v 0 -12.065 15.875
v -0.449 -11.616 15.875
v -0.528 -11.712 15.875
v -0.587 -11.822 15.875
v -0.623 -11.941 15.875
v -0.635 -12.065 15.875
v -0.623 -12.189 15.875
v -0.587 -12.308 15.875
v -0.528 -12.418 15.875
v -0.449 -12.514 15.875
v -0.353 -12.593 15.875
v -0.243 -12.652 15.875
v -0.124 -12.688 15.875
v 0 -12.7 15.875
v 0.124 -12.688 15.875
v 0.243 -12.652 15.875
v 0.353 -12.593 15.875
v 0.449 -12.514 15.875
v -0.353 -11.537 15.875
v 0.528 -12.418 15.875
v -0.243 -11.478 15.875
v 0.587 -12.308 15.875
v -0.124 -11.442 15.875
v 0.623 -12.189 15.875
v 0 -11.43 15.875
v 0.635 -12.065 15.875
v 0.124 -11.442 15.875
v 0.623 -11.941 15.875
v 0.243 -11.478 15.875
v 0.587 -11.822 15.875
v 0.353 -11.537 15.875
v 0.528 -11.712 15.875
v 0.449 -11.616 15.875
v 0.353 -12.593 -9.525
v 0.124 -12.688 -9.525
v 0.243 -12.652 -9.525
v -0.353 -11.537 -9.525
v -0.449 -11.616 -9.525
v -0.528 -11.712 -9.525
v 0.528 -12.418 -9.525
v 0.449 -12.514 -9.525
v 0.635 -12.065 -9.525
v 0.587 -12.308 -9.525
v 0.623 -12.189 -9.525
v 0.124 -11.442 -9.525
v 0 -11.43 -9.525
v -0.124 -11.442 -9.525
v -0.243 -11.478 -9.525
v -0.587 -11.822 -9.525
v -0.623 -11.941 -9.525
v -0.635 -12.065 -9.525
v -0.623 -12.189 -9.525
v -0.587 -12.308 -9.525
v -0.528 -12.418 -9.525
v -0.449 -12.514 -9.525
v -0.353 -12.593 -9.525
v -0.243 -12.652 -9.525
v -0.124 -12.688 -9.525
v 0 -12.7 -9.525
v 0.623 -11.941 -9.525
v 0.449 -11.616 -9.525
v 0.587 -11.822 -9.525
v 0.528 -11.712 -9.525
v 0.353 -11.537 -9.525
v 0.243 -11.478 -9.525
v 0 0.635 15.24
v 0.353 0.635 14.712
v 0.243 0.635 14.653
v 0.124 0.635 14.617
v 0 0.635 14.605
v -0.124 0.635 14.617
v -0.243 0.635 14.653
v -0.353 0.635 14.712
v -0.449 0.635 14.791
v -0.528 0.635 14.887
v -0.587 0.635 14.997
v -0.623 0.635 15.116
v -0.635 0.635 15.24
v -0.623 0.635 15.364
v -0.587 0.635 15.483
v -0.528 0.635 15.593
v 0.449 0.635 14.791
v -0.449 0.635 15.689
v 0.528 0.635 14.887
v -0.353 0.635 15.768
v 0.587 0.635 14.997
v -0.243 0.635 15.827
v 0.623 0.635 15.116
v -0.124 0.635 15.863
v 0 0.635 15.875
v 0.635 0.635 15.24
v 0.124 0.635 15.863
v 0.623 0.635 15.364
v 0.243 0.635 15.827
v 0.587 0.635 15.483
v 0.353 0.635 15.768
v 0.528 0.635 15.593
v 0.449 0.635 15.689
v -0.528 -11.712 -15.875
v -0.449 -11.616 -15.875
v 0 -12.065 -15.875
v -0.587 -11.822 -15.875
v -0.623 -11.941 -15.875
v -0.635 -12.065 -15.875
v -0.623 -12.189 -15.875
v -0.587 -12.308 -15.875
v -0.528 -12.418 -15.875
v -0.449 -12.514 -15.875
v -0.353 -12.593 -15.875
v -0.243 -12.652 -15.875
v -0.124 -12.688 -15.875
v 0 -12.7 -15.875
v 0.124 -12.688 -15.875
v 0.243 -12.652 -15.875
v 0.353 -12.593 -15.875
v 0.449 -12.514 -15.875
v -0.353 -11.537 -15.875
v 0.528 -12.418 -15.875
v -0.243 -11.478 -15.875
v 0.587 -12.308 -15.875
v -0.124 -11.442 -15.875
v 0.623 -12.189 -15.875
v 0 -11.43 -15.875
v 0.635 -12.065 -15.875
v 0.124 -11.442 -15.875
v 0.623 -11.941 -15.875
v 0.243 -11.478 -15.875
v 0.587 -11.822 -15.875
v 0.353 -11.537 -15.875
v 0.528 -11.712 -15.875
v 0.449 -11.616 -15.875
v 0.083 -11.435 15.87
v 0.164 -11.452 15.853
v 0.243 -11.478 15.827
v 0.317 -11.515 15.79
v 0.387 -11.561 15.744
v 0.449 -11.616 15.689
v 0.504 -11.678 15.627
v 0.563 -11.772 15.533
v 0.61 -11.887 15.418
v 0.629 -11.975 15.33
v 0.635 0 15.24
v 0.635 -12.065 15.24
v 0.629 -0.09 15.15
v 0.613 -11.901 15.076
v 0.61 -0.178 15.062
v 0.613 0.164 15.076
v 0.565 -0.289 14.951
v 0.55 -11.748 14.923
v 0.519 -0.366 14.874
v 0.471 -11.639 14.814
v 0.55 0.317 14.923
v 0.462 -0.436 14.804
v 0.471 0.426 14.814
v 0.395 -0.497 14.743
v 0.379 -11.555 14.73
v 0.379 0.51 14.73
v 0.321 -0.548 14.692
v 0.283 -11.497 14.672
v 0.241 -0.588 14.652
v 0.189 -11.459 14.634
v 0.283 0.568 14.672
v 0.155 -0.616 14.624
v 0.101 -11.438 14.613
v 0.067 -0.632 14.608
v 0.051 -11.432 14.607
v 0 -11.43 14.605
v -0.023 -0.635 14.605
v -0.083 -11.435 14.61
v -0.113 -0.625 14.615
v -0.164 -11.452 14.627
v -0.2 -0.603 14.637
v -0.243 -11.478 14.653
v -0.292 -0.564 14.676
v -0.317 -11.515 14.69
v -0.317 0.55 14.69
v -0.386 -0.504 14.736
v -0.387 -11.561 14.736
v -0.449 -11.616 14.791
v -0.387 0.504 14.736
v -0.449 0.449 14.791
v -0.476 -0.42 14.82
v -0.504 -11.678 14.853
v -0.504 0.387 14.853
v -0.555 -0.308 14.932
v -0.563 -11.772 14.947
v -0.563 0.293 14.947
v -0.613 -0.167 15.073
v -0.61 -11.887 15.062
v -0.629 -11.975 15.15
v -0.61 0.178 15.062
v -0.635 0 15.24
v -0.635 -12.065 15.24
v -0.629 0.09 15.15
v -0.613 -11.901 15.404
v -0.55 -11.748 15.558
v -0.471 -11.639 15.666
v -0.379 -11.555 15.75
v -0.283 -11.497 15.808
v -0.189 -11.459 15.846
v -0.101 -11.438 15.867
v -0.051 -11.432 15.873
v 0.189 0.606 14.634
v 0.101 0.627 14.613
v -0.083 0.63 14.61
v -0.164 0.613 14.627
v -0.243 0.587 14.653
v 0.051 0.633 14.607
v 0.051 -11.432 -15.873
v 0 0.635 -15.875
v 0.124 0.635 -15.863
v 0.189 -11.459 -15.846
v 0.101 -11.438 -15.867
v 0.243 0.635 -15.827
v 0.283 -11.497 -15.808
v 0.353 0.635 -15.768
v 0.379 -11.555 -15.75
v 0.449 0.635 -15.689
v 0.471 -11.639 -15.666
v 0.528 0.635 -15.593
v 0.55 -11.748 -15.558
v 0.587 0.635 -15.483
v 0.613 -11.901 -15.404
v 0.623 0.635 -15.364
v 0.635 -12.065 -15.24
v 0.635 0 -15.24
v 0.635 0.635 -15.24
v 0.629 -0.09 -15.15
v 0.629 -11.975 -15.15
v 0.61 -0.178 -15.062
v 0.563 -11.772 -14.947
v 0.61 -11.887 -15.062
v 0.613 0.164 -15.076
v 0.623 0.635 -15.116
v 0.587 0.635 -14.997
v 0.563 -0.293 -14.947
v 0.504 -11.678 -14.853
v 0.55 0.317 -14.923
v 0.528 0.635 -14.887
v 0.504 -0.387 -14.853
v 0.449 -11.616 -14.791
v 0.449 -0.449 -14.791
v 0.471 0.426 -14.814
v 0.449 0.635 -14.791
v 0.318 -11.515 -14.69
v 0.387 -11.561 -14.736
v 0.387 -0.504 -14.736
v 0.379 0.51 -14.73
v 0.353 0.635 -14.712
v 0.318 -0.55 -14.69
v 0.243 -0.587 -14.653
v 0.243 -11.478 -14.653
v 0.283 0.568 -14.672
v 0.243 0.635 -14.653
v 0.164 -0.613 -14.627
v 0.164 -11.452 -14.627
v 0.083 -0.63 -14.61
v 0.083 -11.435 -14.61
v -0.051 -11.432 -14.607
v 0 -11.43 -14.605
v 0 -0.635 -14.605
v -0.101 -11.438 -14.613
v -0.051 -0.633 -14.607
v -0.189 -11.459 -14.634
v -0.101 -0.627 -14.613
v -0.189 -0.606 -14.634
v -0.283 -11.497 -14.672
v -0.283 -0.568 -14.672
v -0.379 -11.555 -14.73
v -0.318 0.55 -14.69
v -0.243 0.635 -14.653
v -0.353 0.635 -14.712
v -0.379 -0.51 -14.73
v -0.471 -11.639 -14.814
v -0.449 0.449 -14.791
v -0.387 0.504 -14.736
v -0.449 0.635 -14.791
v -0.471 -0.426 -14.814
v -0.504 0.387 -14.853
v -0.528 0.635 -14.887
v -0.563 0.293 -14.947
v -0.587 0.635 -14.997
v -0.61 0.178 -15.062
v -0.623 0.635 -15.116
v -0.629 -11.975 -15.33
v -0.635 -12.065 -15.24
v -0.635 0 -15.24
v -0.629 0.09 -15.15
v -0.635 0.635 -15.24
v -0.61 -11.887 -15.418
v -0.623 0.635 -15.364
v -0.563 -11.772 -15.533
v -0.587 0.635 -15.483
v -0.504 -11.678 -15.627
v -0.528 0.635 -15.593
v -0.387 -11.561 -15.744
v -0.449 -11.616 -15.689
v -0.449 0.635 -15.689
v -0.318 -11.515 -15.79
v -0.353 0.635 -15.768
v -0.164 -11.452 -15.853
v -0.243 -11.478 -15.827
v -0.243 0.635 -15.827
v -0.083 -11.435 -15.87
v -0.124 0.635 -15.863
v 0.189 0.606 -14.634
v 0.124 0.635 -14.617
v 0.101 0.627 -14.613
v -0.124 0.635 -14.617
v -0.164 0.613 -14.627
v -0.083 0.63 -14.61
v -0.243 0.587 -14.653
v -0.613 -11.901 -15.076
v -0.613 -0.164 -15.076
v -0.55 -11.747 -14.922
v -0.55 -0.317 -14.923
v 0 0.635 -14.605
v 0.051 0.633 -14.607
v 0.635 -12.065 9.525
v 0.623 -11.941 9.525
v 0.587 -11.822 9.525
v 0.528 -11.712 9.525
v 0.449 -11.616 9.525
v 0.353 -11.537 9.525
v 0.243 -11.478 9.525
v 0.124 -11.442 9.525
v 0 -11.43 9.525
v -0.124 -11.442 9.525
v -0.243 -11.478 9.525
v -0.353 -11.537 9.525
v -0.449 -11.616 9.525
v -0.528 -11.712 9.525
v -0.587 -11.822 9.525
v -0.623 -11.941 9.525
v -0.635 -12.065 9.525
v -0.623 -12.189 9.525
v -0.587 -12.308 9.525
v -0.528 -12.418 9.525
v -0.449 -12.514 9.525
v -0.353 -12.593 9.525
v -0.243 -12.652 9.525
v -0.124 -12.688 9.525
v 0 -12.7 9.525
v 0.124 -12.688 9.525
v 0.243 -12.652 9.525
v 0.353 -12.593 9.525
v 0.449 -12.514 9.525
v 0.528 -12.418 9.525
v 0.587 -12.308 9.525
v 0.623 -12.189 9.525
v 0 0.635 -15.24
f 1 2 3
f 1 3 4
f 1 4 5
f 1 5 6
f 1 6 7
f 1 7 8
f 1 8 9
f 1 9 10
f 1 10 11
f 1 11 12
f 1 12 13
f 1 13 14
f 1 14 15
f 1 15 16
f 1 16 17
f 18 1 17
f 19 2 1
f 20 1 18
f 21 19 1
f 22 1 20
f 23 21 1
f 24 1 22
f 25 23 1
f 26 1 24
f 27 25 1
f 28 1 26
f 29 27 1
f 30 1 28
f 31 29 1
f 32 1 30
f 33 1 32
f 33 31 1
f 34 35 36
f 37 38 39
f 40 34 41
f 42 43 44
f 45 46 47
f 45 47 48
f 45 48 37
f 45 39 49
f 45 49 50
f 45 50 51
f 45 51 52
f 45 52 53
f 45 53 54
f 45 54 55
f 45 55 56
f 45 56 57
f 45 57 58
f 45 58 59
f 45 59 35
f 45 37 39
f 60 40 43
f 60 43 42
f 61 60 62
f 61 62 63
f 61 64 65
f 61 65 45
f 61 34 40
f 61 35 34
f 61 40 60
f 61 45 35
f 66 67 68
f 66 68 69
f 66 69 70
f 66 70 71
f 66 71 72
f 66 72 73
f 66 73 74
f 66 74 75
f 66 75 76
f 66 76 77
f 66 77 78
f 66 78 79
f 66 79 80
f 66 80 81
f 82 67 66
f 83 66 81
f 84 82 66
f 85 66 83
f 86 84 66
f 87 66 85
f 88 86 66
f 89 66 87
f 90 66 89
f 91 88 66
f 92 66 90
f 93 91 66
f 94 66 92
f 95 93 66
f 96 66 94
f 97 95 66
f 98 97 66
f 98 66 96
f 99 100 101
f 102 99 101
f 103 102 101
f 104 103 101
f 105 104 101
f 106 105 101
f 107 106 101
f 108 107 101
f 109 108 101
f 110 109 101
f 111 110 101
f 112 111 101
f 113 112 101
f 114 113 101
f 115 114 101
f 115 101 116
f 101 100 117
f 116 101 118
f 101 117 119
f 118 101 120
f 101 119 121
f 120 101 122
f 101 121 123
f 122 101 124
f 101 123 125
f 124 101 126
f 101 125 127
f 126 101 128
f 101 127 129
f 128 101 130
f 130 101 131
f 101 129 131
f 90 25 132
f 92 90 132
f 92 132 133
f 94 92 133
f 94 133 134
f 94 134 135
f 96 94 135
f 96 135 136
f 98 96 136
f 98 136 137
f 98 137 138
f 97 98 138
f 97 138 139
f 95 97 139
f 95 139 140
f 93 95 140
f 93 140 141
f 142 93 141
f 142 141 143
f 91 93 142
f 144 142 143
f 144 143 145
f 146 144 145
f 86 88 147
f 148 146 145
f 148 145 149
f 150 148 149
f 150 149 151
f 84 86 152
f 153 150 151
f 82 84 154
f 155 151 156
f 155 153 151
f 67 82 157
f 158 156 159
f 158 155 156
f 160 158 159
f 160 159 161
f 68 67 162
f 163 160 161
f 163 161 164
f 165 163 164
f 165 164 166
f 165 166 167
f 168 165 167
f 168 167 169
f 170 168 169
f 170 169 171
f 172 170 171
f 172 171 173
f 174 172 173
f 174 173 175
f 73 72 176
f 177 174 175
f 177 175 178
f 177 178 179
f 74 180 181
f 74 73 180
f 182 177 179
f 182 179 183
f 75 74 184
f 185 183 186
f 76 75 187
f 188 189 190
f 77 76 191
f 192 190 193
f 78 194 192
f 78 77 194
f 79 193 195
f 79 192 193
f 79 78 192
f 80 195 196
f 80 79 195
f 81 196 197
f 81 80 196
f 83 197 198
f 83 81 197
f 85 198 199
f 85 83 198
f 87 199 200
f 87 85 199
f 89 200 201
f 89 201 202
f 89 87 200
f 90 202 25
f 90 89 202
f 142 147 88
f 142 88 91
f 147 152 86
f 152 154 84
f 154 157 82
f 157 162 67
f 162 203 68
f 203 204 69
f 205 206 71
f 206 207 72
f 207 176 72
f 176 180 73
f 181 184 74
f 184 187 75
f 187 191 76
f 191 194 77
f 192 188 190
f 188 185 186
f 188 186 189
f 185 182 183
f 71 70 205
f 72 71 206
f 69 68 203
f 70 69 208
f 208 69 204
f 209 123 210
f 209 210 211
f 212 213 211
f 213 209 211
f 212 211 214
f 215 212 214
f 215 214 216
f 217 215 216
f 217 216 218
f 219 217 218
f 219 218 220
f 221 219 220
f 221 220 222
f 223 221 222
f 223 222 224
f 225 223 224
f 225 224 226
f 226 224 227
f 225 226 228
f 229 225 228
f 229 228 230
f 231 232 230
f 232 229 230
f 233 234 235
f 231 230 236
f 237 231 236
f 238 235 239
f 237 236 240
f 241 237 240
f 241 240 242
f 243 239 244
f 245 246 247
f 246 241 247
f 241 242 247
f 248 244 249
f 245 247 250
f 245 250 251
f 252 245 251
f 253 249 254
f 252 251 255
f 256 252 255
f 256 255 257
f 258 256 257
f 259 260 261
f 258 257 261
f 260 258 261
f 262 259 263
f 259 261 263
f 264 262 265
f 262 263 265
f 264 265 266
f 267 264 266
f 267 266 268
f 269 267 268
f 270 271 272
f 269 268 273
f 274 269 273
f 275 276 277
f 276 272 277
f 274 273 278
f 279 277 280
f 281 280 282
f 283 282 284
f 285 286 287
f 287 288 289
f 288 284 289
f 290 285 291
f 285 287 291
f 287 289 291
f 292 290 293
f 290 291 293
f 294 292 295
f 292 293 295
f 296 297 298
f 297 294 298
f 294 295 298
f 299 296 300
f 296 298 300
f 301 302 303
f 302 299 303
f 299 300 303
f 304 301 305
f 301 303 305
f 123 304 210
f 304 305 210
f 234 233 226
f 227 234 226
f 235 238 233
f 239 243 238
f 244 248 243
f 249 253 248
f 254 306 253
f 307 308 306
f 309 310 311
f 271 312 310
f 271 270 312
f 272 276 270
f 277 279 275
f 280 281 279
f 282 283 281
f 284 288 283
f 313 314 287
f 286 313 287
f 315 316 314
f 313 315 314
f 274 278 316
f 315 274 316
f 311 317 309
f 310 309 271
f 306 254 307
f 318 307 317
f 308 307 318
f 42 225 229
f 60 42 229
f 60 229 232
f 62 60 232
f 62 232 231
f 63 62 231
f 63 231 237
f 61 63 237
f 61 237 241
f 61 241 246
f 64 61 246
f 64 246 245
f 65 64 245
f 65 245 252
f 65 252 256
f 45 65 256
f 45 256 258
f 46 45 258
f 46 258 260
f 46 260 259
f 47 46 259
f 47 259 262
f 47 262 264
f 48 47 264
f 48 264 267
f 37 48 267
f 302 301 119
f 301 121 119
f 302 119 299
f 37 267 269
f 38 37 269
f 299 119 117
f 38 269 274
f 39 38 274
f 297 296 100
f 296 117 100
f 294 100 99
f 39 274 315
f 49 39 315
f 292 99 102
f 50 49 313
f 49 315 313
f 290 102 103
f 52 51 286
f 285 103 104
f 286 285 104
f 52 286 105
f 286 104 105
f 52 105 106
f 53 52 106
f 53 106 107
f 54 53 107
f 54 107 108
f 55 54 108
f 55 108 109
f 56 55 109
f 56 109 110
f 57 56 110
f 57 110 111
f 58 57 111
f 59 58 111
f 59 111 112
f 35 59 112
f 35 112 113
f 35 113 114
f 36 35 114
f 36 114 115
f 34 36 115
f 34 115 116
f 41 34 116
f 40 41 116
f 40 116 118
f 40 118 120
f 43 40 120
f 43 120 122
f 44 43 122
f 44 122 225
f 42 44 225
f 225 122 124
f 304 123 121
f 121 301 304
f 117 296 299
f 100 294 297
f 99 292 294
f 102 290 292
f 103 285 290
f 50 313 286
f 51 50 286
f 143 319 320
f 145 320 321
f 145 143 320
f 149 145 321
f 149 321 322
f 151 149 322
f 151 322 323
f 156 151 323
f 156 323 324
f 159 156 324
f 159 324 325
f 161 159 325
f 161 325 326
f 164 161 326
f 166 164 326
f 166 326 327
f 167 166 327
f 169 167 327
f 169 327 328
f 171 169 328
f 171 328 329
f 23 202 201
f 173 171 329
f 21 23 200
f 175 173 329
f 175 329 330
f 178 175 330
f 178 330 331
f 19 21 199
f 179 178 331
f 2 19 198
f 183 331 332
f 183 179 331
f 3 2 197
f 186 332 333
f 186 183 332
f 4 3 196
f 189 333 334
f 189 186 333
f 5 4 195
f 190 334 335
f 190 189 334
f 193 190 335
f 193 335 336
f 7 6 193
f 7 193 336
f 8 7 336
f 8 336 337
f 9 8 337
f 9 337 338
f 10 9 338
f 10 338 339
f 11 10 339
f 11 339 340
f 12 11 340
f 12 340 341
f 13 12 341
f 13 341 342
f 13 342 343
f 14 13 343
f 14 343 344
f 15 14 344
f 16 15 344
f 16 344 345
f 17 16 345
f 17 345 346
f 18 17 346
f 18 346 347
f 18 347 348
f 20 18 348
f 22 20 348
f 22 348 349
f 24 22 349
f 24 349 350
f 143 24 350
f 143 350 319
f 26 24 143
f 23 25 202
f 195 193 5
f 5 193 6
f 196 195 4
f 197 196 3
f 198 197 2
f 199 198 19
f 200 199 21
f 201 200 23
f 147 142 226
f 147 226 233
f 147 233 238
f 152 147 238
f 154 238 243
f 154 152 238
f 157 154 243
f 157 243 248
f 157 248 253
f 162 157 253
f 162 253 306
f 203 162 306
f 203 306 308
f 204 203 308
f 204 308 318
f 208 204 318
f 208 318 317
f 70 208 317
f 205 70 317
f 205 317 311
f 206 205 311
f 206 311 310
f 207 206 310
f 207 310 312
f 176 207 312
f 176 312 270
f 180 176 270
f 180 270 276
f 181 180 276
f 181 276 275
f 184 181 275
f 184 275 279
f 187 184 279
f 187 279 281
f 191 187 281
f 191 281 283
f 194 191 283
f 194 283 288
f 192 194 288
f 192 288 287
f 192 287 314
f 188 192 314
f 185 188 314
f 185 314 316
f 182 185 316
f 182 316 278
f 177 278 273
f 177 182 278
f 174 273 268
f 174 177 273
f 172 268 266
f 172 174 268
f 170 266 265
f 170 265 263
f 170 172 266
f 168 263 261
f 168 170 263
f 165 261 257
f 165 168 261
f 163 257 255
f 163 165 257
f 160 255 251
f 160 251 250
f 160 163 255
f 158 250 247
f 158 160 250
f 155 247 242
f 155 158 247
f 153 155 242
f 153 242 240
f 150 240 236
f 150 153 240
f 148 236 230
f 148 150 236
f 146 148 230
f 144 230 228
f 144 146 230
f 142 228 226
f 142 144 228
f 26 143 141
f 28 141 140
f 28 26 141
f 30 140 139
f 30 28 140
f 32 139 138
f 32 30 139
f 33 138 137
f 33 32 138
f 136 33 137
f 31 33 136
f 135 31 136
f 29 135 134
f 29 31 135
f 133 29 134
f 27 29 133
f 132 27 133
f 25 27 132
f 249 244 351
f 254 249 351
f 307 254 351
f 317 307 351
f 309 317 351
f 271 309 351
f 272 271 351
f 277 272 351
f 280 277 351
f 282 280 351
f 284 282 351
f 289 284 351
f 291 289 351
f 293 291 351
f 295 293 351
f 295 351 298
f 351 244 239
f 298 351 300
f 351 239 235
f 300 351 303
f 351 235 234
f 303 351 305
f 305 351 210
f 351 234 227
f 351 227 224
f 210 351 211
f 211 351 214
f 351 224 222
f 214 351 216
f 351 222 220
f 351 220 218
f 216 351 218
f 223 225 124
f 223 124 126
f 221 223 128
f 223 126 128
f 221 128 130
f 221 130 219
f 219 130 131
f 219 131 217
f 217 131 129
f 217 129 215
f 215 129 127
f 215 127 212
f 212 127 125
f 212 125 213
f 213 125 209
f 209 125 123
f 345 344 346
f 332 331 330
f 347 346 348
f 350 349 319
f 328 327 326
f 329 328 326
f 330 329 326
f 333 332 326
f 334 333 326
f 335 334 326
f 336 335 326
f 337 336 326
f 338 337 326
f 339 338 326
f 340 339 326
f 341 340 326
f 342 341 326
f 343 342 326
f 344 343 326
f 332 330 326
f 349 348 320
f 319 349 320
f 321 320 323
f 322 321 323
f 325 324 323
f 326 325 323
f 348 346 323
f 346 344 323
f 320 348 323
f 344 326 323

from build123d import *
from build123d.topology import SkipClean

# Parameters (mm, degrees)
SKETCH1_R           = 0.635
BOSS_EXTRUDE1_DEPTH = 15.24
SKETCH2_R           = 0.635
BOSS_EXTRUDE2_DEPTH = 12.7
SKETCH3_R           = 0.635
BOSS_EXTRUDE3_DEPTH = 6.35


with BuildPart() as part:
    # Sketch1 → Boss-Extrude1 (new, symmetric)
    with BuildSketch(Plane.XY):
        Circle(SKETCH1_R)
    extrude(amount=BOSS_EXTRUDE1_DEPTH, both=True)

    # Sketch2 → Boss-Extrude2 (add)
    with BuildSketch(Plane(origin=(0, 0.635, 0), x_dir=(1, 0, 0), z_dir=(0, 1, 0))):
        with Locations((0, -15.24)):
            Circle(SKETCH2_R)
    boss_extrude2 = extrude(amount=-BOSS_EXTRUDE2_DEPTH)

    # Sketch3 → Boss-Extrude3 (add)
    with SkipClean():  # the faces are left unmerged after this step: merging them gives an invalid solid
        with BuildSketch(Plane.XY.offset(15.875)):
            with Locations((0, -12.065)):
                Circle(SKETCH3_R)
        boss_extrude3 = extrude(amount=-BOSS_EXTRUDE3_DEPTH)

    # Mirror1: Boss-Extrude2, Boss-Extrude3 across plane
    with SkipClean():  # the faces are left unmerged after this step: merging them gives an invalid solid
        add(boss_extrude2.mirror(Plane.XY))
        add(boss_extrude3.mirror(Plane.XY))


solid = part.part
